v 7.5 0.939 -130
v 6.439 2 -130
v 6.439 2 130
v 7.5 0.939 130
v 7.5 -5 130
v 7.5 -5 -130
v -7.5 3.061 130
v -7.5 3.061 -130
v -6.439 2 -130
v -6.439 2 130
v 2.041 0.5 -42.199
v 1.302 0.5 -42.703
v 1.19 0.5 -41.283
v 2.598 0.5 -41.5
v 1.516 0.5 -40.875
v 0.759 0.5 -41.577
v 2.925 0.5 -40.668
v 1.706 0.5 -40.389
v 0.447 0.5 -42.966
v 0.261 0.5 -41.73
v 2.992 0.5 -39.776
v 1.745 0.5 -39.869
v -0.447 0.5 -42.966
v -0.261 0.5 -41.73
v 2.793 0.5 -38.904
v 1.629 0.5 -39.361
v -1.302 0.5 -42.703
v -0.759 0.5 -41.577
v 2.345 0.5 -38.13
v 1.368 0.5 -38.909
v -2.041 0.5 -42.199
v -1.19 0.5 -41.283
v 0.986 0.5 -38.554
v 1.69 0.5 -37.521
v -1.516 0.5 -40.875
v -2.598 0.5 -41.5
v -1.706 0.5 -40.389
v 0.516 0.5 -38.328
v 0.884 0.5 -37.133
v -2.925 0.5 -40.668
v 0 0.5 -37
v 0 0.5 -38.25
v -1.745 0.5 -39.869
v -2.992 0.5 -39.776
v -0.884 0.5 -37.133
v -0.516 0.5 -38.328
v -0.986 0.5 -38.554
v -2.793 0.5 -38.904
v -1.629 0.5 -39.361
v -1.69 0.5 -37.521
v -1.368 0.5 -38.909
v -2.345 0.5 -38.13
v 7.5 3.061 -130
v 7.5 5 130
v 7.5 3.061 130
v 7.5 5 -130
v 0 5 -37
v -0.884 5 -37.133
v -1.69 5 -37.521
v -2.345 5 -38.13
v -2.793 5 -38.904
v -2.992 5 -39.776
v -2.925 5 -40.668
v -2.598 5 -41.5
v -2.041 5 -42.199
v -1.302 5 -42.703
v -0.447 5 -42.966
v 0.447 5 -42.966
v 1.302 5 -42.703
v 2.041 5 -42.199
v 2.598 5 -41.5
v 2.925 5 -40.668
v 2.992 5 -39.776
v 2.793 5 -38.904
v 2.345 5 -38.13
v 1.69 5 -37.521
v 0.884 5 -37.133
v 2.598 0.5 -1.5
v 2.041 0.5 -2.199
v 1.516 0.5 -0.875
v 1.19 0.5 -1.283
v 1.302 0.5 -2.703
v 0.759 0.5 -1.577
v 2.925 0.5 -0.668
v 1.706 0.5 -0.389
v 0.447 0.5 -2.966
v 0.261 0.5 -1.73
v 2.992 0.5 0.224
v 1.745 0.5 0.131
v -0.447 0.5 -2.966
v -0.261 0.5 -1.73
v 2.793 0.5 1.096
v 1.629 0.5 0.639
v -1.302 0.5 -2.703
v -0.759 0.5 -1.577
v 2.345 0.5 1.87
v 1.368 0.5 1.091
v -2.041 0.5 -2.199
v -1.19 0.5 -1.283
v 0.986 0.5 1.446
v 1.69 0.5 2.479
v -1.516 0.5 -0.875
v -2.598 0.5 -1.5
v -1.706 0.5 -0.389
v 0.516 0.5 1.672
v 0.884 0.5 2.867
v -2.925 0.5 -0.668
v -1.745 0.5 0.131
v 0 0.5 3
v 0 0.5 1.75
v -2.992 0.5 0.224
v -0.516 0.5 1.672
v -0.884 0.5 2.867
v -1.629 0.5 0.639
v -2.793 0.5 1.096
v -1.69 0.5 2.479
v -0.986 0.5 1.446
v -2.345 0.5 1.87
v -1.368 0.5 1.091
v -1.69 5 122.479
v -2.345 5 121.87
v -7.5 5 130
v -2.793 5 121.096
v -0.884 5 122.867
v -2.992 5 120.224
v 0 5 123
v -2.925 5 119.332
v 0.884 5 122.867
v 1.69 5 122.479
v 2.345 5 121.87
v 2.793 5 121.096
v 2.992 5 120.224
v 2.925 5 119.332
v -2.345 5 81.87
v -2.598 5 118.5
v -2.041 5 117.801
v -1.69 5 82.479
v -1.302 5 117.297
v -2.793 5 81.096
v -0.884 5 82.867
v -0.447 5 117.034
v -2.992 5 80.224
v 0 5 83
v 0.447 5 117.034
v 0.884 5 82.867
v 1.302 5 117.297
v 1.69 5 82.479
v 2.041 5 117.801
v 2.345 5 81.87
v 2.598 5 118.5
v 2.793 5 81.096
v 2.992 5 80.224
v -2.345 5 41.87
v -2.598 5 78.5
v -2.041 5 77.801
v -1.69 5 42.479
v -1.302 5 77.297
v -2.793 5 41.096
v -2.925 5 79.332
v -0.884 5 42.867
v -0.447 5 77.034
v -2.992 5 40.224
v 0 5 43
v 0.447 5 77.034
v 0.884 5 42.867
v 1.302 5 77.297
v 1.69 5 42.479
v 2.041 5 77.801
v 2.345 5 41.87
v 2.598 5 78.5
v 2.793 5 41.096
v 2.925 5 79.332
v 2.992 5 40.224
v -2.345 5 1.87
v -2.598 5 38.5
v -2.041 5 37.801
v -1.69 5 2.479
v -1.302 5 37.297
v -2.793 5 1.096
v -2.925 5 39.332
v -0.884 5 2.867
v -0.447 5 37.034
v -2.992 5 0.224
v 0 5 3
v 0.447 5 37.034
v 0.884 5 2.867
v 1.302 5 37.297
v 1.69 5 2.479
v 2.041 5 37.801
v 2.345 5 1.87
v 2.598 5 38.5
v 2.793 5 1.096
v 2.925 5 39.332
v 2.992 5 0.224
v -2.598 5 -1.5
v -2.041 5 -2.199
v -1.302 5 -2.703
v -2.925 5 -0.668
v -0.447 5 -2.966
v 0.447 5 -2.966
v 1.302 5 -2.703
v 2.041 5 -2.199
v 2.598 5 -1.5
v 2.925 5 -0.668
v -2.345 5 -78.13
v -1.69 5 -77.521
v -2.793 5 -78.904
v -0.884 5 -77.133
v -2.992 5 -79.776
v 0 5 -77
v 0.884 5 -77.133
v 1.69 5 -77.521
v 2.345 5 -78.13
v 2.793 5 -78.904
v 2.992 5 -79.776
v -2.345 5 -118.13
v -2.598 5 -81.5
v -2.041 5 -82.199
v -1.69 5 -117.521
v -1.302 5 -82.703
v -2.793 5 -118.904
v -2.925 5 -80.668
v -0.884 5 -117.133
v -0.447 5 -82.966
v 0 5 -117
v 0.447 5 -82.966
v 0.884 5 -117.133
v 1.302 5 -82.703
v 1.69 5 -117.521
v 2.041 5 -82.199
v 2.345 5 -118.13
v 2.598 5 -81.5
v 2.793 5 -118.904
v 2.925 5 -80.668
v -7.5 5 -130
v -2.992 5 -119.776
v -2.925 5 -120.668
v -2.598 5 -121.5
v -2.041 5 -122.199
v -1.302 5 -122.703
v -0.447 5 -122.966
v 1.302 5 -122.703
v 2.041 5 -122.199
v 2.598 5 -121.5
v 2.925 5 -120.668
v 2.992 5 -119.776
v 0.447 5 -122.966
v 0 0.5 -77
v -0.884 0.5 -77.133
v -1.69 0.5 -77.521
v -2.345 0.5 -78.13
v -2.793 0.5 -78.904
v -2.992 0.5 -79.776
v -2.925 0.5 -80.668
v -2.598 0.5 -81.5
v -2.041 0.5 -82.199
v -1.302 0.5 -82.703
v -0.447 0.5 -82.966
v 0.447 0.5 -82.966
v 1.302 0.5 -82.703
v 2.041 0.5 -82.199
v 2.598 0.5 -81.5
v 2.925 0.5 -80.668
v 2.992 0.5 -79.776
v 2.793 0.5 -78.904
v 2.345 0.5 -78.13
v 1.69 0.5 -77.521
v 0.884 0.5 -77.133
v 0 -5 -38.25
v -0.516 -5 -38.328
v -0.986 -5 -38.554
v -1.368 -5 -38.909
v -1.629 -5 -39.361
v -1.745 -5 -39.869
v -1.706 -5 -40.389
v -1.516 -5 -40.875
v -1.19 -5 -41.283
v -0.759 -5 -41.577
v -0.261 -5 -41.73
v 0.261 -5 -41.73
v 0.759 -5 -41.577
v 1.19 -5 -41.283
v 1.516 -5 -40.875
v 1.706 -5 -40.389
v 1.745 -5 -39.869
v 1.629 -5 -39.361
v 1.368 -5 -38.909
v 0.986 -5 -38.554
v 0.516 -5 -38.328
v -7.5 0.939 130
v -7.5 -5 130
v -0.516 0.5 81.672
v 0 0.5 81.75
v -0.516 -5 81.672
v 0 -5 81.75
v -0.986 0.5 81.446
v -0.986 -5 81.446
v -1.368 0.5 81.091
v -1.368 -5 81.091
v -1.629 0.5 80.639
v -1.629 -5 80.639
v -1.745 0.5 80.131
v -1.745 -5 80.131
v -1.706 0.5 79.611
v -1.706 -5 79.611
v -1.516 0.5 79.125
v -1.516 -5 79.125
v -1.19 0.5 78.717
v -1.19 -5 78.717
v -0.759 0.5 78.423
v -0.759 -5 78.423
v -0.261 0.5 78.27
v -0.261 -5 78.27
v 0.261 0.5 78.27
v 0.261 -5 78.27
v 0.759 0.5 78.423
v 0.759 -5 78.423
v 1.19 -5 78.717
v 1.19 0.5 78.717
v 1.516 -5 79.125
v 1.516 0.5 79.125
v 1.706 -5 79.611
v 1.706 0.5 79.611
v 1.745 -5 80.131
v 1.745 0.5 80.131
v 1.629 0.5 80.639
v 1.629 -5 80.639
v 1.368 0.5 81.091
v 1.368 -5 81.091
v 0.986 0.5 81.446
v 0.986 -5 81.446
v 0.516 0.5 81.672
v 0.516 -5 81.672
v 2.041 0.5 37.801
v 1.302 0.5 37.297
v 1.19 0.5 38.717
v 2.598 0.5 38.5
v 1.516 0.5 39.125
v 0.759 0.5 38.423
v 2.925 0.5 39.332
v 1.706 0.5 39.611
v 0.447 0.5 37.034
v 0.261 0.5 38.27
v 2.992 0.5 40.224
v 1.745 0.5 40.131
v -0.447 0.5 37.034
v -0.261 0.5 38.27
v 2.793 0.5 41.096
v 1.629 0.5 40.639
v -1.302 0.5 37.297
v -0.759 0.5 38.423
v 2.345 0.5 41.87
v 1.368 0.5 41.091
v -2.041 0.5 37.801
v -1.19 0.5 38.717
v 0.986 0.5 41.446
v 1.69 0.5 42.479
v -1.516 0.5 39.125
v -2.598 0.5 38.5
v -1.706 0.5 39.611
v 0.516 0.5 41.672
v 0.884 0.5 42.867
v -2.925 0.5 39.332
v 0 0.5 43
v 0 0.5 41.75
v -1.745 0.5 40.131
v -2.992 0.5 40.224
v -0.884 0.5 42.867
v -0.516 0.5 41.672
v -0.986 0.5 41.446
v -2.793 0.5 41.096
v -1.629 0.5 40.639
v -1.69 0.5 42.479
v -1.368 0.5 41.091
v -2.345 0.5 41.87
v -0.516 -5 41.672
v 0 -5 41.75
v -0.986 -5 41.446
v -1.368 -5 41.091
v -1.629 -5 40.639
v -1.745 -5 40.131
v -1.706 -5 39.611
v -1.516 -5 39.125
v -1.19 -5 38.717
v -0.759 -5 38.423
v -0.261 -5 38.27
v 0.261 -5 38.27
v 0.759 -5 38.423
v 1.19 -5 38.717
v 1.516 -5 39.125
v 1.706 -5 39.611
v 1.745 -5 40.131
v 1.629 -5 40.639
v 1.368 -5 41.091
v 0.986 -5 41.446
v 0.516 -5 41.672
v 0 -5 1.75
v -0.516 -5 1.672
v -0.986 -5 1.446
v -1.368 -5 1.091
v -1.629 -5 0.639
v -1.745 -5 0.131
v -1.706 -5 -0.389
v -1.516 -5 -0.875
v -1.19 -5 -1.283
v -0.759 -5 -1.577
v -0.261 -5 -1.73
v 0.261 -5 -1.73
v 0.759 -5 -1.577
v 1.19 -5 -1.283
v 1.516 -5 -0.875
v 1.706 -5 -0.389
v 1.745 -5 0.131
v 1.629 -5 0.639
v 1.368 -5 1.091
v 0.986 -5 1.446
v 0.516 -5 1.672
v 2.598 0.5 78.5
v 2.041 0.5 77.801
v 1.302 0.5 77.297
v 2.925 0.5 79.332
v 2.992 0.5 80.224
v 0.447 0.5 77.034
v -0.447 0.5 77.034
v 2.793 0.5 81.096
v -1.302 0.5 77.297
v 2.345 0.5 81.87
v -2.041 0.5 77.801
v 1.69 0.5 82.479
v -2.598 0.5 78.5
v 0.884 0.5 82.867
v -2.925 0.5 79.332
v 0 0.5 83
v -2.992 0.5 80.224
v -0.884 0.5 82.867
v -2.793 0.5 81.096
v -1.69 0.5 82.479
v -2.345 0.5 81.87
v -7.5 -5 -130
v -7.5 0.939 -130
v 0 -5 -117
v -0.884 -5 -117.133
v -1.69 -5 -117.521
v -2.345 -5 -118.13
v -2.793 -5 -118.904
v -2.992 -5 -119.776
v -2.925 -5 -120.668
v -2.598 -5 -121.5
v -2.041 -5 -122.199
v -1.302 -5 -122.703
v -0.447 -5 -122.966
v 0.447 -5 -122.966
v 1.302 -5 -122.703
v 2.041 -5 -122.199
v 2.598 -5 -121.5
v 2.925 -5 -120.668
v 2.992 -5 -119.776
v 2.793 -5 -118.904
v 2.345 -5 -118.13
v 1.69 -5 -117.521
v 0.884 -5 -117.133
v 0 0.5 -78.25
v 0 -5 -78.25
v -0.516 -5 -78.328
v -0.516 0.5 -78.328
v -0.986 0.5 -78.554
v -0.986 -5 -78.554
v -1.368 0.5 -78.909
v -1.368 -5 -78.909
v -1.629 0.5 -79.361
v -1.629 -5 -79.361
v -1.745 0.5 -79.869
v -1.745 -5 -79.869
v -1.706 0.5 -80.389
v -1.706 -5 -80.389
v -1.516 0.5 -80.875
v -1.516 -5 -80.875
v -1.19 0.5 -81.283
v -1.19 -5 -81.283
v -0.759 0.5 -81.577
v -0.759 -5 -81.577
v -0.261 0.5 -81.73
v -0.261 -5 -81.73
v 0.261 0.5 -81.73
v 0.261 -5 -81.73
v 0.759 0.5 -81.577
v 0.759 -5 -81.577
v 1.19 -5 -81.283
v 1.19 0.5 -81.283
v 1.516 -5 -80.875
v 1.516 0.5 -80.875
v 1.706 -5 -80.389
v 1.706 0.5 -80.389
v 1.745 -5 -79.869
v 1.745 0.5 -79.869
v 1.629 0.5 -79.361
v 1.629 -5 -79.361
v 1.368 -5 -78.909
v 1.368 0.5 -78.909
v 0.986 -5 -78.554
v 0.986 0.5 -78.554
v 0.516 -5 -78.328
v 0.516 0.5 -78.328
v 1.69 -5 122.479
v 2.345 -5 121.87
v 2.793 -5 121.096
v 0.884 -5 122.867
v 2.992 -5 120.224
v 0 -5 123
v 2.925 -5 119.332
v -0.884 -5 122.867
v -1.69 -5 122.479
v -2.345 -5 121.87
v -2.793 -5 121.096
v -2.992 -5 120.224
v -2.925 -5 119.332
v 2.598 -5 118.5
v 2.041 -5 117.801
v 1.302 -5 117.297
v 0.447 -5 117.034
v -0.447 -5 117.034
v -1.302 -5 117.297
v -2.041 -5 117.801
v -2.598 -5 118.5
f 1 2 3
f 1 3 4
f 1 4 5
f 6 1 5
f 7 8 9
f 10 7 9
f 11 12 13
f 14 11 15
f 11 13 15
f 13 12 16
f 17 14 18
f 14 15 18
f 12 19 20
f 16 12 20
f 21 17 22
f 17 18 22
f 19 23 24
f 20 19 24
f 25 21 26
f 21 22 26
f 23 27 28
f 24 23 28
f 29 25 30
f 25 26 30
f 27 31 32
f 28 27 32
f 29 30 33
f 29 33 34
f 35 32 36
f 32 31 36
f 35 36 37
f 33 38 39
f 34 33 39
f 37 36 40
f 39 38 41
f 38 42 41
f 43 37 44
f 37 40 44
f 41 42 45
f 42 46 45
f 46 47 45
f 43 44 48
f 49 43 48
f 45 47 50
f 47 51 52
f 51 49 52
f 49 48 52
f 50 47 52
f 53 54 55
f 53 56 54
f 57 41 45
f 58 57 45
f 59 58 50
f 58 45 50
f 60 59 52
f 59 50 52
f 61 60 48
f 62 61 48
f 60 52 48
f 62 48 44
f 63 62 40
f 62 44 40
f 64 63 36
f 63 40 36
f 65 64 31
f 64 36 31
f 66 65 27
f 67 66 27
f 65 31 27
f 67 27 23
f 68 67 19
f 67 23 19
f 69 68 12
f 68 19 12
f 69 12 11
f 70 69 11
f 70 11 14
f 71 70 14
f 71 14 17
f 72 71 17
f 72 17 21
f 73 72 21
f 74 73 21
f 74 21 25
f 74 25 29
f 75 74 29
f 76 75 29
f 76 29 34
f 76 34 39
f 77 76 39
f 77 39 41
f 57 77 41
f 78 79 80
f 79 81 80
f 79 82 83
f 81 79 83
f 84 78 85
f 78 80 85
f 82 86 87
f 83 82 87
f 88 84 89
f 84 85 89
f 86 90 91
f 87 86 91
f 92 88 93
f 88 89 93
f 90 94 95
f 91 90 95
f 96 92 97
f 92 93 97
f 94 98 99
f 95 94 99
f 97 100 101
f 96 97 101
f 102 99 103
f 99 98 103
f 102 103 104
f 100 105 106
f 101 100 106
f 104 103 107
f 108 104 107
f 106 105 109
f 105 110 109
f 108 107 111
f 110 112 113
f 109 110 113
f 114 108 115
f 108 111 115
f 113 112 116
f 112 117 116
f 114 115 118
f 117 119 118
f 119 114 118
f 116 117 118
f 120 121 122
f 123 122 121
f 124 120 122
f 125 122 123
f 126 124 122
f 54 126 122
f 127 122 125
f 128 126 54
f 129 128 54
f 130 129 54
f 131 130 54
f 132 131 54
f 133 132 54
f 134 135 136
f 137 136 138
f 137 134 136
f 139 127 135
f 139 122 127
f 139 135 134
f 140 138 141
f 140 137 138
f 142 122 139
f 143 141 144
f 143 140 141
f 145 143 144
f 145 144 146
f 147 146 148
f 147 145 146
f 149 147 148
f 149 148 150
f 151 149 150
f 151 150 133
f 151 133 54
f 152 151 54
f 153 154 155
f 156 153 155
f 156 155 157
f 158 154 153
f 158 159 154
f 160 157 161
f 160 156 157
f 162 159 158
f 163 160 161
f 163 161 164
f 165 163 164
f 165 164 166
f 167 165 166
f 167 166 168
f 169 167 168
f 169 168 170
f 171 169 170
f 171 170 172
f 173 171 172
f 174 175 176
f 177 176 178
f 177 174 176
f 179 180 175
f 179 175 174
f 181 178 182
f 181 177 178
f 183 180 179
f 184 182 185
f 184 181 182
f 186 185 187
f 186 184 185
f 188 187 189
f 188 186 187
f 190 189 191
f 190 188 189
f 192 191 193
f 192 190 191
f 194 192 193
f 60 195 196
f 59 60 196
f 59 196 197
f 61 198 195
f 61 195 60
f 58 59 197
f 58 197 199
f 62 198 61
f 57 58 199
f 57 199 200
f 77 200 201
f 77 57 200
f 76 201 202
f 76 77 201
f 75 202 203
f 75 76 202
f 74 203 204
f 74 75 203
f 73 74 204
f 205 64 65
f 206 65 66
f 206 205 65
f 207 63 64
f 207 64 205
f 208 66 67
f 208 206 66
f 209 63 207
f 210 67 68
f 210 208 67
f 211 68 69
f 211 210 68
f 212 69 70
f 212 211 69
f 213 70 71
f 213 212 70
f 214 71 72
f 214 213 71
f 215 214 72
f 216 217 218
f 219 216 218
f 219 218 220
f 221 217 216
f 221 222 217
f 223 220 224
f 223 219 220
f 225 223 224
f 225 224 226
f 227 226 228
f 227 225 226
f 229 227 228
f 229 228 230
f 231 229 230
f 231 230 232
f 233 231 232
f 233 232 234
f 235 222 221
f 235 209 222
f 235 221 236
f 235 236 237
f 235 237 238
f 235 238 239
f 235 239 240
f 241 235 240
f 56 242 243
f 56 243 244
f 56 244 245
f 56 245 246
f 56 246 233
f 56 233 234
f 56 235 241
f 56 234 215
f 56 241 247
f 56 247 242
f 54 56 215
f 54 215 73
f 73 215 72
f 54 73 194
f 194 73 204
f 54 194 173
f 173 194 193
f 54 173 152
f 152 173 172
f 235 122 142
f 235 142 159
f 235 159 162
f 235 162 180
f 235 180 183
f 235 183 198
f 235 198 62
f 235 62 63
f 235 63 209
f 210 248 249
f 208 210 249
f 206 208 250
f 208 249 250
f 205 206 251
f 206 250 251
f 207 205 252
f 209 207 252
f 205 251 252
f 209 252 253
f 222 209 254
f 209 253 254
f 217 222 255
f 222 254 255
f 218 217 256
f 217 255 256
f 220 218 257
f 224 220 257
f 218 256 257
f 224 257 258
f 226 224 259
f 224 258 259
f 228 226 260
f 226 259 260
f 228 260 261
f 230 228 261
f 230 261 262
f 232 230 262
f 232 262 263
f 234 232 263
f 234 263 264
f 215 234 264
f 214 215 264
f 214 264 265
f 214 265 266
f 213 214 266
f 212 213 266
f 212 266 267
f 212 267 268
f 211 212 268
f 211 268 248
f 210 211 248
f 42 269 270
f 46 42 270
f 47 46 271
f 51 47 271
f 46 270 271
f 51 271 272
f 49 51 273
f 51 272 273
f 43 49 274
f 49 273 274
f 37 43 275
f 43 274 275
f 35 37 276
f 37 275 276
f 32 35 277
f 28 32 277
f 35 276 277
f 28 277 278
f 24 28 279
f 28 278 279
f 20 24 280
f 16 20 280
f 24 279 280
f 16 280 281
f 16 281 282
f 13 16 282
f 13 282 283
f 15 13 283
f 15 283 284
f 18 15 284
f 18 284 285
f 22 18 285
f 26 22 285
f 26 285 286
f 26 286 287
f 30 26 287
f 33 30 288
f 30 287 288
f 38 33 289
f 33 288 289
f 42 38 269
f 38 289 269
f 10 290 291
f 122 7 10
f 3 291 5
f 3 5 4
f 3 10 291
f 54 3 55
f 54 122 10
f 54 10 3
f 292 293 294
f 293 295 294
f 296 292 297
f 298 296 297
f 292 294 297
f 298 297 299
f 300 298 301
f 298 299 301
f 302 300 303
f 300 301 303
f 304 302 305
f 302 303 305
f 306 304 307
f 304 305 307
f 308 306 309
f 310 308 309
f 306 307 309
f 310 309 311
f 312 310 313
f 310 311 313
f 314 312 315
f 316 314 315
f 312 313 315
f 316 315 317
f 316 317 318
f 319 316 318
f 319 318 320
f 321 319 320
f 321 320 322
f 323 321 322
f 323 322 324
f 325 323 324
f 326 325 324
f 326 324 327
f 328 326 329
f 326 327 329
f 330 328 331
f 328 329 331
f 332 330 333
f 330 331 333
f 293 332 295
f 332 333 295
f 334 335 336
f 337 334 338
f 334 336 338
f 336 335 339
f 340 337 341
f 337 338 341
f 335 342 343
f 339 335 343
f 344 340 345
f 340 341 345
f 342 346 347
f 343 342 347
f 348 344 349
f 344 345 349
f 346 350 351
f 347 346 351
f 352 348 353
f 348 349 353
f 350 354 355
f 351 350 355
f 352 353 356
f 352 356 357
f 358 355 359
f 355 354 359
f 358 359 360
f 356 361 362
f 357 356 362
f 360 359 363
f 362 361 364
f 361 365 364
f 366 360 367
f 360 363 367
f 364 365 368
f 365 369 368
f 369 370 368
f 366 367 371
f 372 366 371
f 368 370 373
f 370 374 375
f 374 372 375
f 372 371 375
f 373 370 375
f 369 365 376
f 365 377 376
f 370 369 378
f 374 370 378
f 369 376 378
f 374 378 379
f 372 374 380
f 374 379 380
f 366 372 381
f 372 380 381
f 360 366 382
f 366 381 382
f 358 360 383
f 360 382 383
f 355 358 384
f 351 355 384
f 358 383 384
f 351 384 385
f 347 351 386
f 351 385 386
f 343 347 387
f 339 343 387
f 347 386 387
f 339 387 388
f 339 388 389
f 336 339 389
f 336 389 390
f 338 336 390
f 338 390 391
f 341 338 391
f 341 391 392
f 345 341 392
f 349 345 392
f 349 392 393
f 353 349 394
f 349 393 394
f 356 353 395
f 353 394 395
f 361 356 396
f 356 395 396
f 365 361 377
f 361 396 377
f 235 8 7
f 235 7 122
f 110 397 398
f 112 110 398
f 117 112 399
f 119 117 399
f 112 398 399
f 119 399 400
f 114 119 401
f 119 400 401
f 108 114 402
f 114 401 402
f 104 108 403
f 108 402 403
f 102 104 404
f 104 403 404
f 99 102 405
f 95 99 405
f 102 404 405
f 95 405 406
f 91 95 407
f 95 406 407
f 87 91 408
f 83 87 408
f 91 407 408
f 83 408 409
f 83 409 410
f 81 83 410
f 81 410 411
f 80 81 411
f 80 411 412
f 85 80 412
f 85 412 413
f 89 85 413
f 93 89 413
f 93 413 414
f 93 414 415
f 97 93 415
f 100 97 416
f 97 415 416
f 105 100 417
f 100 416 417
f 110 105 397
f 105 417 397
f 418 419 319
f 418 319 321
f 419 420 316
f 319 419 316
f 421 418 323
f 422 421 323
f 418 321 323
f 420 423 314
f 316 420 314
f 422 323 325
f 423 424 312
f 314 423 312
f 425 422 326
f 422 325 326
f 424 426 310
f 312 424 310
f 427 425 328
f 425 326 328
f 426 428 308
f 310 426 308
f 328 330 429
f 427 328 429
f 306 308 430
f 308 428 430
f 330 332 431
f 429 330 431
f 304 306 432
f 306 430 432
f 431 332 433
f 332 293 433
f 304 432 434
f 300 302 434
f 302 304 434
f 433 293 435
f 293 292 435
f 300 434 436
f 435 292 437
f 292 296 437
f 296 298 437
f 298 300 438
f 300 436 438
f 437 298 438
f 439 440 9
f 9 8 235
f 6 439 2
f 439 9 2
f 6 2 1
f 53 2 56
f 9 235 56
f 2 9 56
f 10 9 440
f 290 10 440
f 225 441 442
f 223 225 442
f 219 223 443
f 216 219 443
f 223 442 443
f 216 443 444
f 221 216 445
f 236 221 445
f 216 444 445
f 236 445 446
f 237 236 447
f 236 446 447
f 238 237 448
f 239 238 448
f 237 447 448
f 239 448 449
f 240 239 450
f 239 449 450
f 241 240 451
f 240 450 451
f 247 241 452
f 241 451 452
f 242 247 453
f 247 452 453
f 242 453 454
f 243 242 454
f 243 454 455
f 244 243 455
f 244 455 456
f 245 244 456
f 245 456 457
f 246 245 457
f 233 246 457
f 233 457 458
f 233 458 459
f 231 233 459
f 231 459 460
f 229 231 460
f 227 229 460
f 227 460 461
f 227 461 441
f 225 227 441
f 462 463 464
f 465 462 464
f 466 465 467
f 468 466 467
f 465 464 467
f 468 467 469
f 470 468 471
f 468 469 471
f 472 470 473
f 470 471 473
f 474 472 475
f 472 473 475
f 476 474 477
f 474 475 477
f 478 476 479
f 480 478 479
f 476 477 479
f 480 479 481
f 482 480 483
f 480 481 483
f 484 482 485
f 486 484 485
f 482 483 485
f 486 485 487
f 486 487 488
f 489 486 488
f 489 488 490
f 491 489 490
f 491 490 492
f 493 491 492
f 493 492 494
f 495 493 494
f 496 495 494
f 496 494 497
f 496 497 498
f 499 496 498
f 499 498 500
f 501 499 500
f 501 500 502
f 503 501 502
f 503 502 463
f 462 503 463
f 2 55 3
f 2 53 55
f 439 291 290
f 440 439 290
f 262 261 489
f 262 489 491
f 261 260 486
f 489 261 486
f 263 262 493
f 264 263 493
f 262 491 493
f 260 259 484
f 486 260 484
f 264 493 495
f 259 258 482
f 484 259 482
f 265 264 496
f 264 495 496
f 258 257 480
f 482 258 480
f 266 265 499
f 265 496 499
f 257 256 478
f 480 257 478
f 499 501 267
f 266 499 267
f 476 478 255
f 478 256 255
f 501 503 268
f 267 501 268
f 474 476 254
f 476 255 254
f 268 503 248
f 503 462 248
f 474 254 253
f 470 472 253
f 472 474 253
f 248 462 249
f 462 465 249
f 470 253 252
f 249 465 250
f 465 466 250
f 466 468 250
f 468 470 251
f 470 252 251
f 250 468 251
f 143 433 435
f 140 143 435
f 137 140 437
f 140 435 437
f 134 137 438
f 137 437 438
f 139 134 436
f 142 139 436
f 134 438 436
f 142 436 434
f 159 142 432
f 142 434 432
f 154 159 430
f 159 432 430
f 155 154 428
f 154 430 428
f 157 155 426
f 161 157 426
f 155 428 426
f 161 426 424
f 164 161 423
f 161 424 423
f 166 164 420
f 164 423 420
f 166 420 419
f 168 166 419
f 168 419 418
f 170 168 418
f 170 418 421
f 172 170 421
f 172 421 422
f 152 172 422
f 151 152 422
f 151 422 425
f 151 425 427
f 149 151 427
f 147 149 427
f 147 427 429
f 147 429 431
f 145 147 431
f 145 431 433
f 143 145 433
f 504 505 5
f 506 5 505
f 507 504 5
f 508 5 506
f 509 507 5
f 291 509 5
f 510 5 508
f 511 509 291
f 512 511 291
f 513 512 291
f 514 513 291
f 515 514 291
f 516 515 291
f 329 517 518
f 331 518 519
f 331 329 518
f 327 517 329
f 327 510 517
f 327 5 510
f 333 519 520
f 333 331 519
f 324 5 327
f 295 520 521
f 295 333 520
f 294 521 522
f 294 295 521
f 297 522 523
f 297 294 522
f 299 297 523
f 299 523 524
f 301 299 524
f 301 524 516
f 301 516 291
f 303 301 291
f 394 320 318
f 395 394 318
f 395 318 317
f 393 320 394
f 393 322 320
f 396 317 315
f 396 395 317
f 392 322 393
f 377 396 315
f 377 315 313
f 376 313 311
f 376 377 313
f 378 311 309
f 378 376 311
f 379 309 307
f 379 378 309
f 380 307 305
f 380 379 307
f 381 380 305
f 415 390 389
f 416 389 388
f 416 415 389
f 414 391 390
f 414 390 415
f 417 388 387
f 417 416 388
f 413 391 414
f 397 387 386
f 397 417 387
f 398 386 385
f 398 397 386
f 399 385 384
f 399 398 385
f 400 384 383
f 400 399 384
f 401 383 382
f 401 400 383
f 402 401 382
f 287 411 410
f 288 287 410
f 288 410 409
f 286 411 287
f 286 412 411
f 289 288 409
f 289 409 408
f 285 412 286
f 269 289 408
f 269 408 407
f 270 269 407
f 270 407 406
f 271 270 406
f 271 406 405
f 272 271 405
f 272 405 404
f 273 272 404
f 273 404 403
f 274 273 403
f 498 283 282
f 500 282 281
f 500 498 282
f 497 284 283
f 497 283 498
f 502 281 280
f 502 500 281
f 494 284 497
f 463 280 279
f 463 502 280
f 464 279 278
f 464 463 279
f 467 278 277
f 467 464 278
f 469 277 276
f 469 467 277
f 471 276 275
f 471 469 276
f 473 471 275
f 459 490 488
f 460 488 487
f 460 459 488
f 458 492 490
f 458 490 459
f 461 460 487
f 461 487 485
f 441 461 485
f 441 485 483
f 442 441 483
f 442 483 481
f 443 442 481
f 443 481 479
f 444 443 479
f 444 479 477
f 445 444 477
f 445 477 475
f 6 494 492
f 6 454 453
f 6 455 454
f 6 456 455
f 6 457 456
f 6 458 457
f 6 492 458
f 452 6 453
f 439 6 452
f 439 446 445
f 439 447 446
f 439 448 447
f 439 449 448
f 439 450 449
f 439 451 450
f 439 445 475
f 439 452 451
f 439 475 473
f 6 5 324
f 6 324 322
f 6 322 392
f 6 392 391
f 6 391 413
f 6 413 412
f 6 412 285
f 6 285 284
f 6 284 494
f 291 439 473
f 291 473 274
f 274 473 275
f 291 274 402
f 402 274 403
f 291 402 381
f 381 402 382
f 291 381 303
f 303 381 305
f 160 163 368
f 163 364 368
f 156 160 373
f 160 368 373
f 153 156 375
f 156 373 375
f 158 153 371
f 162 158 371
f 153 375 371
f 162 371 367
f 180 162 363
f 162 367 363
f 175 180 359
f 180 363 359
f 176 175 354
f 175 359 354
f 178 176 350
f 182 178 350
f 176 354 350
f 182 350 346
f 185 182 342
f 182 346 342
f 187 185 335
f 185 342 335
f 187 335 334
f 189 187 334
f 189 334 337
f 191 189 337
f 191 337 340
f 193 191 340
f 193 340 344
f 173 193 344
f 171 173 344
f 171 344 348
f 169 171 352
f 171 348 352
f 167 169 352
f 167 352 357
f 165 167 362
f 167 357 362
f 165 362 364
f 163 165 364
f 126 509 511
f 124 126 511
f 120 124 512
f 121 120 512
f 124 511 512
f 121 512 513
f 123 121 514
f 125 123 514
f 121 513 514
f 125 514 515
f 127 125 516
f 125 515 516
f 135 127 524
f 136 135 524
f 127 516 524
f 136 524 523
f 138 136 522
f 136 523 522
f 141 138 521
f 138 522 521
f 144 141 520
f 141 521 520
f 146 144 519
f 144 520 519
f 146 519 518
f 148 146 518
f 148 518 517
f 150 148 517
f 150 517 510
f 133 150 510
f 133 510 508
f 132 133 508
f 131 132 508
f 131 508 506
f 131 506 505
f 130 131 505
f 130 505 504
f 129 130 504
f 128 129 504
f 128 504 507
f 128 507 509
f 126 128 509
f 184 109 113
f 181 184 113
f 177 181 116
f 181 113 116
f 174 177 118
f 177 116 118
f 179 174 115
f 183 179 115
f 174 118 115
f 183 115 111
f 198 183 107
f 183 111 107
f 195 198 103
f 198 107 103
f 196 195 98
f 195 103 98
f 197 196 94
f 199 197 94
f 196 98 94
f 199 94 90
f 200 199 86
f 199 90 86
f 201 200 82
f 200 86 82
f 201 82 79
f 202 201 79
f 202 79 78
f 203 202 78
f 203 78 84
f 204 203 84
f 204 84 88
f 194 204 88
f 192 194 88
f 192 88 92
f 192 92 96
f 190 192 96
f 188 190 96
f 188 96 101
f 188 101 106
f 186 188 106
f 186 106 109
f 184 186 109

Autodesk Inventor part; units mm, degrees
ref_plane "YZ Plane" through (0, 0, 0) normal (1, 0, 0) x (0, 1, 0)
ref_plane "XZ Plane" through (0, 0, 0) normal (0, 1, 0) x (-1, 0, 0)
ref_plane "XY Plane" through (0, 0, 0) normal (0, 0, 1) x (1, 0, 0)
sketch "Sketch1" plane through (0, 0, 0) normal (0, 0, 1) x (1, 0, 0)
  line L0 (-7.5, 5) -> (7.5, 5)
  line L1 (7.5, 5) -> (7.5, -5)
  line L2 (7.5, -5) -> (-7.5, -5)
  line L3 (-7.5, -5) -> (-7.5, 5)
  line L4 (-7.5, 5) -> (7.5, -5) construction
  line L5 (7.5, 5) -> (-7.5, -5) construction
  line L6 (-7.5, 3.0607) -> (-6.4393, 2)
  line L7 (-7.5, 3.0607) -> (-6, 3.0607) construction
  line L8 (-6.4393, 2) -> (-7.5, 0.9393)
  line L9 (0, 5) -> (0, -5) construction
  line L10 (7.5, 3.0607) -> (6.4393, 2)
  line L11 (6.4393, 2) -> (7.5, 0.9393)
  point P0 (0, 0)
  point P1 (7.5, 0.9393)
  point P2 (7.5, 3.0607)
  dimension "d0" = 15
  dimension "d1" = 10
  dimension "d2" = 45
  dimension "d3" = 3
  dimension "d4" = 1.5
extrude "Extrusion1" add sketch "Sketch1" along normal mid plane 260 contours L0 L1 L10 L11 L2 L3 L8 L6
sketch "Sketch2" plane through (-7.5, 5, 130) normal (0, 1, 0) x (1, 0, 0)
  point P0 (7.5, 130)
  point P1 (7.5, 130)
hole "Hole1" at (0, 5, 0) direction (0, -1, 0) diameter 3.5 end through all counterbore diameter 6 counterbore depth 4.5
pattern_linear "Rectangular Pattern1" count 7 spacing 40 along (0, 0, 1) of "Hole1" first direction both ways yes
sketch "Sketch4" plane through (-7.5, 5, 130) normal (0, 1, 0) x (1, 0, 0)
  circle A0 centre (7.5, 250) radius 3 projected
  circle A1 centre (7.5, 10) radius 3 projected
  point P0 (7.5, 130)
hole "Hole3" at (0, 5, 120) at (0, 5, -120) direction (0, -1, 0) diameter 6 end through all
properties part number "MGN15 Rail Middle" material "Stainless Steel, 440C"
